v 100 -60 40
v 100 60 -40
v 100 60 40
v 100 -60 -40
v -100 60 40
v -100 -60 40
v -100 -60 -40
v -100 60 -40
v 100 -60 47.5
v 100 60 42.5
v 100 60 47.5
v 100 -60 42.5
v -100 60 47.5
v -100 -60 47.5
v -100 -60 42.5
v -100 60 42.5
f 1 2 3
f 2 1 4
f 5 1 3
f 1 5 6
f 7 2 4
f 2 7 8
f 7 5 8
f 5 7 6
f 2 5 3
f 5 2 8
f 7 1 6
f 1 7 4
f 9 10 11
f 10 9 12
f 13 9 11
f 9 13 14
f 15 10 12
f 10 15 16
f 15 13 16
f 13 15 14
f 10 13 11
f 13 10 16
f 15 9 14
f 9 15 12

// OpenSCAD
// Archiyou -> OpenSCAD  |  script: programmaticparams  |  units: mm
// OpenSCAD has no units: coordinates are in mm.
// Parts: 2 CSG, 0 baked, 0 2D
// Parameters at export, for reference only (nothing in this file is linked to them):
//   WIDTH = 200
//   DEPTH = 120
//   HEIGHT = 80
//   SHOW_LID = true

$fn = 32;
PART = "";

module base() {
    color([0, 0, 1]) cube([200, 120, 80], center = true);
}

// Mesh:Box
module Mesh_Box() {
    color([1, 0, 0]) translate([0, 0, 45]) cube([200, 120, 5], center = true);
}

// 3D parts
if (PART == "" || PART == "base") base();
if (PART == "" || PART == "Mesh_Box") Mesh_Box();
